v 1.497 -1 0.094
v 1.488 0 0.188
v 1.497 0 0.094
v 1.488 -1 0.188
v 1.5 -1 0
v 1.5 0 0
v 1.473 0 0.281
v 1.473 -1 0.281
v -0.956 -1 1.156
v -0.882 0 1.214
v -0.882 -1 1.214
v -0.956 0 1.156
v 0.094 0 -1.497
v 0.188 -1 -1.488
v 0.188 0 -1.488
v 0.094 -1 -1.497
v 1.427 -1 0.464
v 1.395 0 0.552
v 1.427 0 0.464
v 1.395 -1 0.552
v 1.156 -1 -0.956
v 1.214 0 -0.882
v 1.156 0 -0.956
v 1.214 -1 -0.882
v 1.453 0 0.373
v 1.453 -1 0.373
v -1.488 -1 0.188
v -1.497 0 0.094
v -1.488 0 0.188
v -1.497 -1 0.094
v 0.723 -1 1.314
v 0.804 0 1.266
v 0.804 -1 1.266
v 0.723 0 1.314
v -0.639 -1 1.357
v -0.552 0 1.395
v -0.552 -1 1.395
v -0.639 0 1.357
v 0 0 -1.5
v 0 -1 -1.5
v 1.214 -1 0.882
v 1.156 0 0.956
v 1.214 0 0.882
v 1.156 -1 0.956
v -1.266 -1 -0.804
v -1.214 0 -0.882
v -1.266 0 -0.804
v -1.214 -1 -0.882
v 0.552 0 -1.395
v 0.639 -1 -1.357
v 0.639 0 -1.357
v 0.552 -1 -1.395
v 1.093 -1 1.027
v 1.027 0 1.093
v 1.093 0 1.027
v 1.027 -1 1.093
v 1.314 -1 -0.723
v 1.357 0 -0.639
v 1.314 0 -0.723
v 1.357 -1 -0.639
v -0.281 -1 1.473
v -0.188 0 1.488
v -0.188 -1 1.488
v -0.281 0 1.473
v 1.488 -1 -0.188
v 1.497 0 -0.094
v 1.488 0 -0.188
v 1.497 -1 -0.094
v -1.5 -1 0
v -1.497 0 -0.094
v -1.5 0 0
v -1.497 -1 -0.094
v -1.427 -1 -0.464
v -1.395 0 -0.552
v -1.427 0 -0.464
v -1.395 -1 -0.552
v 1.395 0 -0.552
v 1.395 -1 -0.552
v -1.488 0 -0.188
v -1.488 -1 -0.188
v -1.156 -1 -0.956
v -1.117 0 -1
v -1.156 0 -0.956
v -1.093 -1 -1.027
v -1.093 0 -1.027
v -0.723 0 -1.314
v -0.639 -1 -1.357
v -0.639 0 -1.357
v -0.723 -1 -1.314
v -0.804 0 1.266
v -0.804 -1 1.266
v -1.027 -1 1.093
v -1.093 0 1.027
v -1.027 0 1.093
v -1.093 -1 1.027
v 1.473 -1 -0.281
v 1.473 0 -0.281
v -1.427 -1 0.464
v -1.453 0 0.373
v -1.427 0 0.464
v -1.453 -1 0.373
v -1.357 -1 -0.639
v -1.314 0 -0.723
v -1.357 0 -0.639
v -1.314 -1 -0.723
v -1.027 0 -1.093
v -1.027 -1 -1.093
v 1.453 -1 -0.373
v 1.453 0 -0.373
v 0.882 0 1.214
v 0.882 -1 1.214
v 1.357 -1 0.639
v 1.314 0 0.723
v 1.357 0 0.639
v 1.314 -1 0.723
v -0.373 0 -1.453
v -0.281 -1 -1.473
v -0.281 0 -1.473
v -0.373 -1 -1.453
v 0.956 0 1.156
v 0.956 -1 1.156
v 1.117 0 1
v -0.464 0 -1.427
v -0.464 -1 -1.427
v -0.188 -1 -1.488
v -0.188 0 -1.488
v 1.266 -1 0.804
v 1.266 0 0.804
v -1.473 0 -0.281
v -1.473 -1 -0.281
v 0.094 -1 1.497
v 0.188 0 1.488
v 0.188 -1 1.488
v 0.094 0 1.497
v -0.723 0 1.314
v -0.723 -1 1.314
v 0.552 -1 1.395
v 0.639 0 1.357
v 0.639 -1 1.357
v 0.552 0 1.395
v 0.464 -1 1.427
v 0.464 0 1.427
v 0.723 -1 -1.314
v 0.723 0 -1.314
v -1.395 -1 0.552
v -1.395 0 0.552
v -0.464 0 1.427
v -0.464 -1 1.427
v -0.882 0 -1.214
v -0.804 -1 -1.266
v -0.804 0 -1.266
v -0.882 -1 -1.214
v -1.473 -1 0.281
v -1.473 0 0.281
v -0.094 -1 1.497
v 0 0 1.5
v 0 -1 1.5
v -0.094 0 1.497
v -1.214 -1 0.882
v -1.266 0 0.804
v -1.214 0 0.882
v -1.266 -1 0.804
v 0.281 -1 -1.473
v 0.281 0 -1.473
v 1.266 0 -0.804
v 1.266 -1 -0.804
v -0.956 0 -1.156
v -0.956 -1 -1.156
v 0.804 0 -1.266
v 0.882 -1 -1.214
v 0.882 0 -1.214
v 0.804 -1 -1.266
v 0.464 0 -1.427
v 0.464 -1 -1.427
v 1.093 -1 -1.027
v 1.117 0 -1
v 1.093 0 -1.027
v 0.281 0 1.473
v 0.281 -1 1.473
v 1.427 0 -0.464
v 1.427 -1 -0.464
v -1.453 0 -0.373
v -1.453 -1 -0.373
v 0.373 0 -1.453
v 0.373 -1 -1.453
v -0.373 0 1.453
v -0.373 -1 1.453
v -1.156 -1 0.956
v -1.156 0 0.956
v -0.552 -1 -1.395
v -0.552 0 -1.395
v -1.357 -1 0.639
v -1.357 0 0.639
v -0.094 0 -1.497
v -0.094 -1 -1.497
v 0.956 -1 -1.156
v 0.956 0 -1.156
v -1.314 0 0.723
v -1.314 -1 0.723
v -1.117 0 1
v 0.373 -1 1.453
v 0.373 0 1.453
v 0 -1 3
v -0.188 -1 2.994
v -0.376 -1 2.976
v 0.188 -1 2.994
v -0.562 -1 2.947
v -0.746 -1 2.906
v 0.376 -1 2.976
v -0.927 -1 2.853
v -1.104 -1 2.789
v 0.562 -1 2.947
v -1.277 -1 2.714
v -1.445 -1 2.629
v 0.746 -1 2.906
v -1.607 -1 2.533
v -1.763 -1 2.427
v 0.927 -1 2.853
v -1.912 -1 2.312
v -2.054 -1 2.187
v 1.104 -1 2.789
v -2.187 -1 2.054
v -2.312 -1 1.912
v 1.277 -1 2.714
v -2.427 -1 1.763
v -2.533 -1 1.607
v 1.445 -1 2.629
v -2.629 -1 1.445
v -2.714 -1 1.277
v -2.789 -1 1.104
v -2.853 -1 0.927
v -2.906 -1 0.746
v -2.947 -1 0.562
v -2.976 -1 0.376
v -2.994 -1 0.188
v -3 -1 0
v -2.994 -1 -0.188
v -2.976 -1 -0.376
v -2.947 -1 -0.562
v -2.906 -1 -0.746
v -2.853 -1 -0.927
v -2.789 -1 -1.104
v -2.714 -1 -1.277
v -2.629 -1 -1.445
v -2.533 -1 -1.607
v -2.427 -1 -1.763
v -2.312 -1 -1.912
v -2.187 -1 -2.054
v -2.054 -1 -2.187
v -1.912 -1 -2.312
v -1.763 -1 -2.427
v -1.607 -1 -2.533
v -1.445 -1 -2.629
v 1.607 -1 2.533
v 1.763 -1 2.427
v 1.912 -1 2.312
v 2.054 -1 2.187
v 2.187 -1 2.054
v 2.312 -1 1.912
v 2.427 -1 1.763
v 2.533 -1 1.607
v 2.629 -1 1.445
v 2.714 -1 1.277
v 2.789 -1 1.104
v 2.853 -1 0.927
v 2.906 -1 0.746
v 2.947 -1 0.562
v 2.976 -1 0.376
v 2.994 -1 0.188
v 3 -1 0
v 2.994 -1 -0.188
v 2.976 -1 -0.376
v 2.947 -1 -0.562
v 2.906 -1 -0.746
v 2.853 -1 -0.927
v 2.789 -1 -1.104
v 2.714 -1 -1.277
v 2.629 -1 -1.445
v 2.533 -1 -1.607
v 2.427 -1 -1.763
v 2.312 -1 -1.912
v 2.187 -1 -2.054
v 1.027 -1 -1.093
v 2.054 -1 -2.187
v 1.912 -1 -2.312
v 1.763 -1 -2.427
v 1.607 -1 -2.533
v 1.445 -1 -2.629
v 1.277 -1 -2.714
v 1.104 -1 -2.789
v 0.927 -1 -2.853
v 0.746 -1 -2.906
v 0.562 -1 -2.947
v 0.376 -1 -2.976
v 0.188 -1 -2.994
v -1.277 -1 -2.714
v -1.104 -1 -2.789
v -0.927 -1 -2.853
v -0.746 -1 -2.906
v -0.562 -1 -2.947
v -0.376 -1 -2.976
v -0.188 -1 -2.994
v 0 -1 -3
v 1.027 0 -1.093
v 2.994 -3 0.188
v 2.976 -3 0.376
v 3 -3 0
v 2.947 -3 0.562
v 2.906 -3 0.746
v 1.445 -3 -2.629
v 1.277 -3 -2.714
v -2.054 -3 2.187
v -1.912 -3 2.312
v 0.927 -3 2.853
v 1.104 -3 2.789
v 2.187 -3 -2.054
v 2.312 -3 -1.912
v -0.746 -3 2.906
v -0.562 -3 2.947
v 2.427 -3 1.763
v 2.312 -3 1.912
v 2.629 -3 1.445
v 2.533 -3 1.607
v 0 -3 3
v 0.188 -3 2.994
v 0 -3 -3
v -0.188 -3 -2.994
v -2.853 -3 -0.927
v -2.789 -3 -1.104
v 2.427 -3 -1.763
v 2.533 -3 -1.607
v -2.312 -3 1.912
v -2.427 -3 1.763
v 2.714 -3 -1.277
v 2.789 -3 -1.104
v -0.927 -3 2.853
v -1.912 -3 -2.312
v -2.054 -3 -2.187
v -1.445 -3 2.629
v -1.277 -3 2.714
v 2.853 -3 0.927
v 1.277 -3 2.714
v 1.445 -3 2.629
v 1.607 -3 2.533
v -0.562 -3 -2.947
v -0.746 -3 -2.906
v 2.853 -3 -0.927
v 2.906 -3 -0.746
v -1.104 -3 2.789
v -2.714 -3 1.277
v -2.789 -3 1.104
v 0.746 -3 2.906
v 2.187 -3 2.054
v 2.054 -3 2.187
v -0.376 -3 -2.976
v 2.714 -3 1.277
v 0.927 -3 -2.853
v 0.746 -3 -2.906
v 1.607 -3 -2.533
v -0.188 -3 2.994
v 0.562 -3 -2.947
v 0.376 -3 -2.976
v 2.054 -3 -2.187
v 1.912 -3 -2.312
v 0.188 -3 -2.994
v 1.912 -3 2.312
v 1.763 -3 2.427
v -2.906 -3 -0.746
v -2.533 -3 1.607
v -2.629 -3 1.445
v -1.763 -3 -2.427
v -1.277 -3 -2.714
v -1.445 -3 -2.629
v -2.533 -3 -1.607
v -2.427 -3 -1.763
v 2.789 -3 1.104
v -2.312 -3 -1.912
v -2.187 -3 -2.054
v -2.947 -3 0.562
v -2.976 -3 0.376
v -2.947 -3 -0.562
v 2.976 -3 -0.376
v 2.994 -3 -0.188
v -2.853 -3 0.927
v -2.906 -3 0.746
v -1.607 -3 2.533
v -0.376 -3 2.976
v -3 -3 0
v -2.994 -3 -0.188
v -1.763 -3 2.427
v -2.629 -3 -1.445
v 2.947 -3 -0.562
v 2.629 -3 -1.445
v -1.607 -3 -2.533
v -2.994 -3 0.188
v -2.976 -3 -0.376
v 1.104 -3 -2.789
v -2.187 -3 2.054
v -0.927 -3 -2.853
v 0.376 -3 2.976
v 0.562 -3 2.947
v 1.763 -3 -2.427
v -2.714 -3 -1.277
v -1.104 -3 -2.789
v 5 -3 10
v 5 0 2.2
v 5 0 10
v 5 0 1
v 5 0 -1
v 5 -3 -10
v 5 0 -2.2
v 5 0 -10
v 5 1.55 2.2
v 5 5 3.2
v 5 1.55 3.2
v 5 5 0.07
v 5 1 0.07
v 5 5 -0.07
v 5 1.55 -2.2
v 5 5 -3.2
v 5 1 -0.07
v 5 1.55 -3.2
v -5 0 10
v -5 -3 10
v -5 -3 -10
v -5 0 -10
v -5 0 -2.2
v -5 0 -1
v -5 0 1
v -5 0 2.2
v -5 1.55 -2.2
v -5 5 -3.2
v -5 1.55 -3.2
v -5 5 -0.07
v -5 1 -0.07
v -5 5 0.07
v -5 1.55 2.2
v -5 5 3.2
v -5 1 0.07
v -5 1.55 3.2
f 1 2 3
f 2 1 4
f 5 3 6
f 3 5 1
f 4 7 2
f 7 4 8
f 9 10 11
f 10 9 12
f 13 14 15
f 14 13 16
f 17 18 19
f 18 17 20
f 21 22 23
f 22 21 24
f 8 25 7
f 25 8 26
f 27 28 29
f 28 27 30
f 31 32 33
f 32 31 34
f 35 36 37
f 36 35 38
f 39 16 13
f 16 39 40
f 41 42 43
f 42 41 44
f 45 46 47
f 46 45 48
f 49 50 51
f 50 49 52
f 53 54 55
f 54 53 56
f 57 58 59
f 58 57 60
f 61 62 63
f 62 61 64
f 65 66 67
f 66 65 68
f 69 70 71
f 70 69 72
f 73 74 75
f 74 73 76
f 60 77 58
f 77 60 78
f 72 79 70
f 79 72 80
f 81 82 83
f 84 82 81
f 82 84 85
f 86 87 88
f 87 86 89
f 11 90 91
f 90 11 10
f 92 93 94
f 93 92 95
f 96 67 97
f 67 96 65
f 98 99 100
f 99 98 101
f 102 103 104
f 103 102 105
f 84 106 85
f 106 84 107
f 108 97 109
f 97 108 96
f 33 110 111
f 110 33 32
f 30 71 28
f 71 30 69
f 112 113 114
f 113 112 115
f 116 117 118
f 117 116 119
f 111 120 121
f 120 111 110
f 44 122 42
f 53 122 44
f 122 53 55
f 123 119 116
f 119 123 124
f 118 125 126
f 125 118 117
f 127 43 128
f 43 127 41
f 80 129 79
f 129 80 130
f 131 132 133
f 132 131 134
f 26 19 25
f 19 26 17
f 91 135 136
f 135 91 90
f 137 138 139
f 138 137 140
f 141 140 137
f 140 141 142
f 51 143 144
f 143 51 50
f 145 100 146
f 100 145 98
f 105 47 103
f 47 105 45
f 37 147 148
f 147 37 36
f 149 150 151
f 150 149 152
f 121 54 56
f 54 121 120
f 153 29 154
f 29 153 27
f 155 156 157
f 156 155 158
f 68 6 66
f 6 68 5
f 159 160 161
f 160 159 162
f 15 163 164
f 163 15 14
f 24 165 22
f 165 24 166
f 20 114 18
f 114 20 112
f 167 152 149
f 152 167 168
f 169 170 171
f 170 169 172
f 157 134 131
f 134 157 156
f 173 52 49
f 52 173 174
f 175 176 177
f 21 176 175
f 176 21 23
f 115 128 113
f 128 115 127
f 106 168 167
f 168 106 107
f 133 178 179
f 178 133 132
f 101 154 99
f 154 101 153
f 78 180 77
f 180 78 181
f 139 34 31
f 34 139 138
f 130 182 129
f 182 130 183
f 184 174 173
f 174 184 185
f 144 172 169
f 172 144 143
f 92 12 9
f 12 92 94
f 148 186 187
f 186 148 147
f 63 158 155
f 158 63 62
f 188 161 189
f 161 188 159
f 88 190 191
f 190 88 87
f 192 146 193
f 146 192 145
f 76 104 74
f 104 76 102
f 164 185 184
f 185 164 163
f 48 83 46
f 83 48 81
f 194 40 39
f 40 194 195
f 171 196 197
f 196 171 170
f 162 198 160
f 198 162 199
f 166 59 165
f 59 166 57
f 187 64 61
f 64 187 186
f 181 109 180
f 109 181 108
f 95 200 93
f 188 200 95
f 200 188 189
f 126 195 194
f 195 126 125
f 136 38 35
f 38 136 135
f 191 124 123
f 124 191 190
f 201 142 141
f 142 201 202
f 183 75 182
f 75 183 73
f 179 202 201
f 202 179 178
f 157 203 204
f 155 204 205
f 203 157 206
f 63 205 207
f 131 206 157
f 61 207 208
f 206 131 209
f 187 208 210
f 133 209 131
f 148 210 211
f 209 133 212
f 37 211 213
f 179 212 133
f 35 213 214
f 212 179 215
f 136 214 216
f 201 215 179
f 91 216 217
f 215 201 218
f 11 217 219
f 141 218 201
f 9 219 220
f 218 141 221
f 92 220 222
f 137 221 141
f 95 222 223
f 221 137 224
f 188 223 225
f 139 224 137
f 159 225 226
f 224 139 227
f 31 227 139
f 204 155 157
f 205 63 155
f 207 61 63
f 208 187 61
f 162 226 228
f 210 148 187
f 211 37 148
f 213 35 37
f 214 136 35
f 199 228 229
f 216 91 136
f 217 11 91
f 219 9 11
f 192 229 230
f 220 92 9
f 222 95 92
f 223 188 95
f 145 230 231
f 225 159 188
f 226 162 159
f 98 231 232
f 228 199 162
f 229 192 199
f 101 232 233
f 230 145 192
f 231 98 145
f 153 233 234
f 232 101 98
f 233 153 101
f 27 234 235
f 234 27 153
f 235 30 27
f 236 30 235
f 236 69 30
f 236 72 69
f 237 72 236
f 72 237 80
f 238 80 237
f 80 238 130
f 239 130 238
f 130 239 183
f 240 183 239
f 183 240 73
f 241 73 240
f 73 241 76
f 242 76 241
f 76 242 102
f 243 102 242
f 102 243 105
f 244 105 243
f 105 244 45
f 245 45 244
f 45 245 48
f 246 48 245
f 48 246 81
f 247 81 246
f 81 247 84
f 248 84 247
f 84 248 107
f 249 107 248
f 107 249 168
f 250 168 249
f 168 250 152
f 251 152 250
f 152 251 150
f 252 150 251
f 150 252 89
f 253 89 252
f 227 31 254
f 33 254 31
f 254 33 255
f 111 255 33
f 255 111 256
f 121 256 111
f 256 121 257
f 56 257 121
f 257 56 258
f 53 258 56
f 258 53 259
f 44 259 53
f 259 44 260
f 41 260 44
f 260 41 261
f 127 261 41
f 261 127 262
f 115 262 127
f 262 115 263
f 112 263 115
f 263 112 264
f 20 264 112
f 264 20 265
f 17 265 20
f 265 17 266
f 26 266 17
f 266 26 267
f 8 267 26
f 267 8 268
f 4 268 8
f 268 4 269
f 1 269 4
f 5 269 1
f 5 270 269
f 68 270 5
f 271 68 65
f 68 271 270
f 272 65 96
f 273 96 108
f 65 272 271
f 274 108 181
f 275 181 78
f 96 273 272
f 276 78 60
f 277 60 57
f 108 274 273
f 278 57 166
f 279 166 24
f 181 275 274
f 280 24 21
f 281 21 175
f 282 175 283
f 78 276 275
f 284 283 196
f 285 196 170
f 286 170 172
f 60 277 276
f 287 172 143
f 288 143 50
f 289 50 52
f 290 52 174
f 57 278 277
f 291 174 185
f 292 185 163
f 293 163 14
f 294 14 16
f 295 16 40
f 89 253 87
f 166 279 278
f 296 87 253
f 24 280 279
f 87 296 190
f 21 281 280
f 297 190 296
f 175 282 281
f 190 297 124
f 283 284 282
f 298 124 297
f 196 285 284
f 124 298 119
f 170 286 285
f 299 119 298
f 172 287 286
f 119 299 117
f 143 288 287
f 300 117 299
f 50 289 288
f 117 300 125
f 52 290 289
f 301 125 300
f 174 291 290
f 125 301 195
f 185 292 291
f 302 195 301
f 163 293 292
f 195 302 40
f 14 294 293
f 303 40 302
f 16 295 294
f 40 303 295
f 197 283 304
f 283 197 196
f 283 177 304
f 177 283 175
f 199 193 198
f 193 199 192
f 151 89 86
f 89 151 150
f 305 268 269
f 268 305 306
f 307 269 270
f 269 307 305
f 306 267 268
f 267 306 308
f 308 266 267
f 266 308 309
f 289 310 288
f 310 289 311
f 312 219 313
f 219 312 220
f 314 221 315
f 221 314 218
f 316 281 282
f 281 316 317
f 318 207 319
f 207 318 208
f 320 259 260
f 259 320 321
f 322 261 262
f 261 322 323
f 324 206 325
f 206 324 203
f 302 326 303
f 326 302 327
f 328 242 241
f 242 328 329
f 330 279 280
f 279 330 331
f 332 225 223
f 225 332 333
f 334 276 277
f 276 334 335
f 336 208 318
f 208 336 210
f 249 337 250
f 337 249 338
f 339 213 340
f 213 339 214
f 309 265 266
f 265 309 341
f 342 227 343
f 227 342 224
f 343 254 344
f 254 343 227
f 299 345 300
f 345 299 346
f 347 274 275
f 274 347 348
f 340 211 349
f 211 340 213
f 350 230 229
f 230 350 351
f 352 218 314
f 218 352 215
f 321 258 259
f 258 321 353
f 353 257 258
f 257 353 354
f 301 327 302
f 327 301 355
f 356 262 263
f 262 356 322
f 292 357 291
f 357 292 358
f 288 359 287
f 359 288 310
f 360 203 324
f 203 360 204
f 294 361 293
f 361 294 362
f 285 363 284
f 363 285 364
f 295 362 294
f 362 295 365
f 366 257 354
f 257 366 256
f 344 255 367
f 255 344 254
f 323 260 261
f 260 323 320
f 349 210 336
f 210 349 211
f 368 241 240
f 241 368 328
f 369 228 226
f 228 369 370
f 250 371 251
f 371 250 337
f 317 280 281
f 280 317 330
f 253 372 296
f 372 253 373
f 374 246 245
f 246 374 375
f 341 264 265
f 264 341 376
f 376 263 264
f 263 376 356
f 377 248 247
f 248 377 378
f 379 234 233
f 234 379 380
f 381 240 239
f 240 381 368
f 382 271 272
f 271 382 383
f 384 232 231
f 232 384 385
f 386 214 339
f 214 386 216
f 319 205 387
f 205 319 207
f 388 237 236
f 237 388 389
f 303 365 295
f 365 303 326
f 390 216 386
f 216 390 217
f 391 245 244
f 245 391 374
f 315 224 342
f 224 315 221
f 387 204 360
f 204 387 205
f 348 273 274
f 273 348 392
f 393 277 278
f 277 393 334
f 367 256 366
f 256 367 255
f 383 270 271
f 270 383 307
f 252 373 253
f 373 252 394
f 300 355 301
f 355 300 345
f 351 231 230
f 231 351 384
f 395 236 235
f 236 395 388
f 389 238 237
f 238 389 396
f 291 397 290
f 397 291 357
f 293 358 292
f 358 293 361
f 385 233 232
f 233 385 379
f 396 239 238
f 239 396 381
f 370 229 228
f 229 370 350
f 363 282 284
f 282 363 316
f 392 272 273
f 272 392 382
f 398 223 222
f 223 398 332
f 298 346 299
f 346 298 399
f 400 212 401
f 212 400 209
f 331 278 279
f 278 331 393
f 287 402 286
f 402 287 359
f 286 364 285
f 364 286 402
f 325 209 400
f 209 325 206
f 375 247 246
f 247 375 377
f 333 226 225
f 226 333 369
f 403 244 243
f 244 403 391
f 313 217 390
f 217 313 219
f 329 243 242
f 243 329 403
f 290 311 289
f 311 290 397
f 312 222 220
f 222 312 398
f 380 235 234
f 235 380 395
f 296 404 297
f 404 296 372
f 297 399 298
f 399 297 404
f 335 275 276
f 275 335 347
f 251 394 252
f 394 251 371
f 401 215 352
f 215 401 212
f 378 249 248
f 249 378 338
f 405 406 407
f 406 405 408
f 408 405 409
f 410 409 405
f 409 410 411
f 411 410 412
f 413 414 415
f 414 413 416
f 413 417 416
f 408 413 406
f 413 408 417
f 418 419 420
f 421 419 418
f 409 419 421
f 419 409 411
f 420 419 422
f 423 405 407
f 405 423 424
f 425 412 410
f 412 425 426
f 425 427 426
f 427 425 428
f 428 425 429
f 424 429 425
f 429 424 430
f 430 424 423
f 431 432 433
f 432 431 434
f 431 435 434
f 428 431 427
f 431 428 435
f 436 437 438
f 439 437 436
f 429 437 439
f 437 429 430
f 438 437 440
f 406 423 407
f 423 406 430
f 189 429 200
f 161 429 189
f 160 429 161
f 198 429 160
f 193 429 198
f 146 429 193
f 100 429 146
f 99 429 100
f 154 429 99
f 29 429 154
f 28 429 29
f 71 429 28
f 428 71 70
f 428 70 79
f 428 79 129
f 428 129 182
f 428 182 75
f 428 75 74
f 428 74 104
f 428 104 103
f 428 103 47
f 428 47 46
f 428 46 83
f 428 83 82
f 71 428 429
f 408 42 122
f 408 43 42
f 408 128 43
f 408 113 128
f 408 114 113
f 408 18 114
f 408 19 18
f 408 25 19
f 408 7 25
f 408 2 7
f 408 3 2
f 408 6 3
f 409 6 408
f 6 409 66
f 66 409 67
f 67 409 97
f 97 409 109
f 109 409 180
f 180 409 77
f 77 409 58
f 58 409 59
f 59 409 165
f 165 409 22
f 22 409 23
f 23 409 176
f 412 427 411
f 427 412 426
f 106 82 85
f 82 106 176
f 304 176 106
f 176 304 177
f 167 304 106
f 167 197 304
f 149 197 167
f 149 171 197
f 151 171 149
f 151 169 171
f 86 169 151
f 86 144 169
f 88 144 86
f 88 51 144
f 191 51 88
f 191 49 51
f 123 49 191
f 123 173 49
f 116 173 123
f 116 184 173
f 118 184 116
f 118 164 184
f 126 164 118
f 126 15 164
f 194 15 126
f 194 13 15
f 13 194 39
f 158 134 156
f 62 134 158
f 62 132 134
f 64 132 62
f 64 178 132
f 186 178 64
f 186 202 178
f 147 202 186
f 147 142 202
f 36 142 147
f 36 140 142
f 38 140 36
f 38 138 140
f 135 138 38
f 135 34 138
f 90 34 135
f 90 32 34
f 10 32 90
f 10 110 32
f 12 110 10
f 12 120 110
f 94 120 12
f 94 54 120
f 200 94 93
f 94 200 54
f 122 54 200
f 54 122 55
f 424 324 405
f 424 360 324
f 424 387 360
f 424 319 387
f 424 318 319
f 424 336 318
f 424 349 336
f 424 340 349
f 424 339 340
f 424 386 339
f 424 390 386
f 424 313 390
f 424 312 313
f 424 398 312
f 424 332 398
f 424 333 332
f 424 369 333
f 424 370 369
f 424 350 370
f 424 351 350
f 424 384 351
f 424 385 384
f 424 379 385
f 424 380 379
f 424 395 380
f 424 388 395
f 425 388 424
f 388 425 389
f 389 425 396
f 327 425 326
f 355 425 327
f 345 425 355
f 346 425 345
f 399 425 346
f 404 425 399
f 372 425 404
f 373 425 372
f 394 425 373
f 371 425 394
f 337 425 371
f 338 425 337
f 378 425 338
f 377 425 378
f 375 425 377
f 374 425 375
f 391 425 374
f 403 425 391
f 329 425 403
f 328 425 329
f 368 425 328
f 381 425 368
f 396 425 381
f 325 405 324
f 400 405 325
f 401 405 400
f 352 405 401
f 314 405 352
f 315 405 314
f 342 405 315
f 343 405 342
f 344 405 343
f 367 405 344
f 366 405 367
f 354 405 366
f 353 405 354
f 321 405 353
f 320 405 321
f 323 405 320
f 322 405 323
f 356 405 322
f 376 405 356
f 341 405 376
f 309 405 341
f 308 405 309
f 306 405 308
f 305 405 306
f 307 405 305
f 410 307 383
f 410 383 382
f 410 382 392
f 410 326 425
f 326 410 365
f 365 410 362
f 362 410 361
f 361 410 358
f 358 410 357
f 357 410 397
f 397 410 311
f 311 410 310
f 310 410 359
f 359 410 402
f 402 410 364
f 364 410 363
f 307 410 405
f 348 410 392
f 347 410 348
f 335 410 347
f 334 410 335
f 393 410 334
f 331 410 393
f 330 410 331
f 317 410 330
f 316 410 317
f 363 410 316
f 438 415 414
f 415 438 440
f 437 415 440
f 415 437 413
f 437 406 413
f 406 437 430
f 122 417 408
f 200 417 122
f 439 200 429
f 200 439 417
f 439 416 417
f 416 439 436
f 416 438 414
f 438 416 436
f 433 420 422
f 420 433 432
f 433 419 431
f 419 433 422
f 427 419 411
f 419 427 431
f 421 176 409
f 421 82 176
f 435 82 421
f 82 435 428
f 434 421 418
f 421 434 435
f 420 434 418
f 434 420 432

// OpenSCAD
width=6.4;

module x() 
    translate([-10/2, 0, 0])
    rotate([90, 0, 90])
    linear_extrude(height=10)
    polygon(points=[
        [0, 3/2-0.5],
        [0, width/2-1], 
        [1.55, width/2-1],
        [1.55, width/2],
        [5, width/2],
        [5, 0+0.07],
        [5-4, 0+0.07]
    ]);

x();
mirror([0, 0, 1]) x();


difference() {
    union() {
        difference() {
            translate([0, -3/2, 0]) cube([10, 3, 20], center=true);
            translate([0, 6-1, 0]) rotate([90, 0, 0]) m3_screw();
        }
    }
    
        translate([0, 1.55/2, 0]) cube([10, 1.55, 3], center=true);
}


module m3_screw() {
    $fn=100;
    cylinder(h=6, d=3);
    translate([0, 0, 6]) cylinder(h=10, d=6);
}
